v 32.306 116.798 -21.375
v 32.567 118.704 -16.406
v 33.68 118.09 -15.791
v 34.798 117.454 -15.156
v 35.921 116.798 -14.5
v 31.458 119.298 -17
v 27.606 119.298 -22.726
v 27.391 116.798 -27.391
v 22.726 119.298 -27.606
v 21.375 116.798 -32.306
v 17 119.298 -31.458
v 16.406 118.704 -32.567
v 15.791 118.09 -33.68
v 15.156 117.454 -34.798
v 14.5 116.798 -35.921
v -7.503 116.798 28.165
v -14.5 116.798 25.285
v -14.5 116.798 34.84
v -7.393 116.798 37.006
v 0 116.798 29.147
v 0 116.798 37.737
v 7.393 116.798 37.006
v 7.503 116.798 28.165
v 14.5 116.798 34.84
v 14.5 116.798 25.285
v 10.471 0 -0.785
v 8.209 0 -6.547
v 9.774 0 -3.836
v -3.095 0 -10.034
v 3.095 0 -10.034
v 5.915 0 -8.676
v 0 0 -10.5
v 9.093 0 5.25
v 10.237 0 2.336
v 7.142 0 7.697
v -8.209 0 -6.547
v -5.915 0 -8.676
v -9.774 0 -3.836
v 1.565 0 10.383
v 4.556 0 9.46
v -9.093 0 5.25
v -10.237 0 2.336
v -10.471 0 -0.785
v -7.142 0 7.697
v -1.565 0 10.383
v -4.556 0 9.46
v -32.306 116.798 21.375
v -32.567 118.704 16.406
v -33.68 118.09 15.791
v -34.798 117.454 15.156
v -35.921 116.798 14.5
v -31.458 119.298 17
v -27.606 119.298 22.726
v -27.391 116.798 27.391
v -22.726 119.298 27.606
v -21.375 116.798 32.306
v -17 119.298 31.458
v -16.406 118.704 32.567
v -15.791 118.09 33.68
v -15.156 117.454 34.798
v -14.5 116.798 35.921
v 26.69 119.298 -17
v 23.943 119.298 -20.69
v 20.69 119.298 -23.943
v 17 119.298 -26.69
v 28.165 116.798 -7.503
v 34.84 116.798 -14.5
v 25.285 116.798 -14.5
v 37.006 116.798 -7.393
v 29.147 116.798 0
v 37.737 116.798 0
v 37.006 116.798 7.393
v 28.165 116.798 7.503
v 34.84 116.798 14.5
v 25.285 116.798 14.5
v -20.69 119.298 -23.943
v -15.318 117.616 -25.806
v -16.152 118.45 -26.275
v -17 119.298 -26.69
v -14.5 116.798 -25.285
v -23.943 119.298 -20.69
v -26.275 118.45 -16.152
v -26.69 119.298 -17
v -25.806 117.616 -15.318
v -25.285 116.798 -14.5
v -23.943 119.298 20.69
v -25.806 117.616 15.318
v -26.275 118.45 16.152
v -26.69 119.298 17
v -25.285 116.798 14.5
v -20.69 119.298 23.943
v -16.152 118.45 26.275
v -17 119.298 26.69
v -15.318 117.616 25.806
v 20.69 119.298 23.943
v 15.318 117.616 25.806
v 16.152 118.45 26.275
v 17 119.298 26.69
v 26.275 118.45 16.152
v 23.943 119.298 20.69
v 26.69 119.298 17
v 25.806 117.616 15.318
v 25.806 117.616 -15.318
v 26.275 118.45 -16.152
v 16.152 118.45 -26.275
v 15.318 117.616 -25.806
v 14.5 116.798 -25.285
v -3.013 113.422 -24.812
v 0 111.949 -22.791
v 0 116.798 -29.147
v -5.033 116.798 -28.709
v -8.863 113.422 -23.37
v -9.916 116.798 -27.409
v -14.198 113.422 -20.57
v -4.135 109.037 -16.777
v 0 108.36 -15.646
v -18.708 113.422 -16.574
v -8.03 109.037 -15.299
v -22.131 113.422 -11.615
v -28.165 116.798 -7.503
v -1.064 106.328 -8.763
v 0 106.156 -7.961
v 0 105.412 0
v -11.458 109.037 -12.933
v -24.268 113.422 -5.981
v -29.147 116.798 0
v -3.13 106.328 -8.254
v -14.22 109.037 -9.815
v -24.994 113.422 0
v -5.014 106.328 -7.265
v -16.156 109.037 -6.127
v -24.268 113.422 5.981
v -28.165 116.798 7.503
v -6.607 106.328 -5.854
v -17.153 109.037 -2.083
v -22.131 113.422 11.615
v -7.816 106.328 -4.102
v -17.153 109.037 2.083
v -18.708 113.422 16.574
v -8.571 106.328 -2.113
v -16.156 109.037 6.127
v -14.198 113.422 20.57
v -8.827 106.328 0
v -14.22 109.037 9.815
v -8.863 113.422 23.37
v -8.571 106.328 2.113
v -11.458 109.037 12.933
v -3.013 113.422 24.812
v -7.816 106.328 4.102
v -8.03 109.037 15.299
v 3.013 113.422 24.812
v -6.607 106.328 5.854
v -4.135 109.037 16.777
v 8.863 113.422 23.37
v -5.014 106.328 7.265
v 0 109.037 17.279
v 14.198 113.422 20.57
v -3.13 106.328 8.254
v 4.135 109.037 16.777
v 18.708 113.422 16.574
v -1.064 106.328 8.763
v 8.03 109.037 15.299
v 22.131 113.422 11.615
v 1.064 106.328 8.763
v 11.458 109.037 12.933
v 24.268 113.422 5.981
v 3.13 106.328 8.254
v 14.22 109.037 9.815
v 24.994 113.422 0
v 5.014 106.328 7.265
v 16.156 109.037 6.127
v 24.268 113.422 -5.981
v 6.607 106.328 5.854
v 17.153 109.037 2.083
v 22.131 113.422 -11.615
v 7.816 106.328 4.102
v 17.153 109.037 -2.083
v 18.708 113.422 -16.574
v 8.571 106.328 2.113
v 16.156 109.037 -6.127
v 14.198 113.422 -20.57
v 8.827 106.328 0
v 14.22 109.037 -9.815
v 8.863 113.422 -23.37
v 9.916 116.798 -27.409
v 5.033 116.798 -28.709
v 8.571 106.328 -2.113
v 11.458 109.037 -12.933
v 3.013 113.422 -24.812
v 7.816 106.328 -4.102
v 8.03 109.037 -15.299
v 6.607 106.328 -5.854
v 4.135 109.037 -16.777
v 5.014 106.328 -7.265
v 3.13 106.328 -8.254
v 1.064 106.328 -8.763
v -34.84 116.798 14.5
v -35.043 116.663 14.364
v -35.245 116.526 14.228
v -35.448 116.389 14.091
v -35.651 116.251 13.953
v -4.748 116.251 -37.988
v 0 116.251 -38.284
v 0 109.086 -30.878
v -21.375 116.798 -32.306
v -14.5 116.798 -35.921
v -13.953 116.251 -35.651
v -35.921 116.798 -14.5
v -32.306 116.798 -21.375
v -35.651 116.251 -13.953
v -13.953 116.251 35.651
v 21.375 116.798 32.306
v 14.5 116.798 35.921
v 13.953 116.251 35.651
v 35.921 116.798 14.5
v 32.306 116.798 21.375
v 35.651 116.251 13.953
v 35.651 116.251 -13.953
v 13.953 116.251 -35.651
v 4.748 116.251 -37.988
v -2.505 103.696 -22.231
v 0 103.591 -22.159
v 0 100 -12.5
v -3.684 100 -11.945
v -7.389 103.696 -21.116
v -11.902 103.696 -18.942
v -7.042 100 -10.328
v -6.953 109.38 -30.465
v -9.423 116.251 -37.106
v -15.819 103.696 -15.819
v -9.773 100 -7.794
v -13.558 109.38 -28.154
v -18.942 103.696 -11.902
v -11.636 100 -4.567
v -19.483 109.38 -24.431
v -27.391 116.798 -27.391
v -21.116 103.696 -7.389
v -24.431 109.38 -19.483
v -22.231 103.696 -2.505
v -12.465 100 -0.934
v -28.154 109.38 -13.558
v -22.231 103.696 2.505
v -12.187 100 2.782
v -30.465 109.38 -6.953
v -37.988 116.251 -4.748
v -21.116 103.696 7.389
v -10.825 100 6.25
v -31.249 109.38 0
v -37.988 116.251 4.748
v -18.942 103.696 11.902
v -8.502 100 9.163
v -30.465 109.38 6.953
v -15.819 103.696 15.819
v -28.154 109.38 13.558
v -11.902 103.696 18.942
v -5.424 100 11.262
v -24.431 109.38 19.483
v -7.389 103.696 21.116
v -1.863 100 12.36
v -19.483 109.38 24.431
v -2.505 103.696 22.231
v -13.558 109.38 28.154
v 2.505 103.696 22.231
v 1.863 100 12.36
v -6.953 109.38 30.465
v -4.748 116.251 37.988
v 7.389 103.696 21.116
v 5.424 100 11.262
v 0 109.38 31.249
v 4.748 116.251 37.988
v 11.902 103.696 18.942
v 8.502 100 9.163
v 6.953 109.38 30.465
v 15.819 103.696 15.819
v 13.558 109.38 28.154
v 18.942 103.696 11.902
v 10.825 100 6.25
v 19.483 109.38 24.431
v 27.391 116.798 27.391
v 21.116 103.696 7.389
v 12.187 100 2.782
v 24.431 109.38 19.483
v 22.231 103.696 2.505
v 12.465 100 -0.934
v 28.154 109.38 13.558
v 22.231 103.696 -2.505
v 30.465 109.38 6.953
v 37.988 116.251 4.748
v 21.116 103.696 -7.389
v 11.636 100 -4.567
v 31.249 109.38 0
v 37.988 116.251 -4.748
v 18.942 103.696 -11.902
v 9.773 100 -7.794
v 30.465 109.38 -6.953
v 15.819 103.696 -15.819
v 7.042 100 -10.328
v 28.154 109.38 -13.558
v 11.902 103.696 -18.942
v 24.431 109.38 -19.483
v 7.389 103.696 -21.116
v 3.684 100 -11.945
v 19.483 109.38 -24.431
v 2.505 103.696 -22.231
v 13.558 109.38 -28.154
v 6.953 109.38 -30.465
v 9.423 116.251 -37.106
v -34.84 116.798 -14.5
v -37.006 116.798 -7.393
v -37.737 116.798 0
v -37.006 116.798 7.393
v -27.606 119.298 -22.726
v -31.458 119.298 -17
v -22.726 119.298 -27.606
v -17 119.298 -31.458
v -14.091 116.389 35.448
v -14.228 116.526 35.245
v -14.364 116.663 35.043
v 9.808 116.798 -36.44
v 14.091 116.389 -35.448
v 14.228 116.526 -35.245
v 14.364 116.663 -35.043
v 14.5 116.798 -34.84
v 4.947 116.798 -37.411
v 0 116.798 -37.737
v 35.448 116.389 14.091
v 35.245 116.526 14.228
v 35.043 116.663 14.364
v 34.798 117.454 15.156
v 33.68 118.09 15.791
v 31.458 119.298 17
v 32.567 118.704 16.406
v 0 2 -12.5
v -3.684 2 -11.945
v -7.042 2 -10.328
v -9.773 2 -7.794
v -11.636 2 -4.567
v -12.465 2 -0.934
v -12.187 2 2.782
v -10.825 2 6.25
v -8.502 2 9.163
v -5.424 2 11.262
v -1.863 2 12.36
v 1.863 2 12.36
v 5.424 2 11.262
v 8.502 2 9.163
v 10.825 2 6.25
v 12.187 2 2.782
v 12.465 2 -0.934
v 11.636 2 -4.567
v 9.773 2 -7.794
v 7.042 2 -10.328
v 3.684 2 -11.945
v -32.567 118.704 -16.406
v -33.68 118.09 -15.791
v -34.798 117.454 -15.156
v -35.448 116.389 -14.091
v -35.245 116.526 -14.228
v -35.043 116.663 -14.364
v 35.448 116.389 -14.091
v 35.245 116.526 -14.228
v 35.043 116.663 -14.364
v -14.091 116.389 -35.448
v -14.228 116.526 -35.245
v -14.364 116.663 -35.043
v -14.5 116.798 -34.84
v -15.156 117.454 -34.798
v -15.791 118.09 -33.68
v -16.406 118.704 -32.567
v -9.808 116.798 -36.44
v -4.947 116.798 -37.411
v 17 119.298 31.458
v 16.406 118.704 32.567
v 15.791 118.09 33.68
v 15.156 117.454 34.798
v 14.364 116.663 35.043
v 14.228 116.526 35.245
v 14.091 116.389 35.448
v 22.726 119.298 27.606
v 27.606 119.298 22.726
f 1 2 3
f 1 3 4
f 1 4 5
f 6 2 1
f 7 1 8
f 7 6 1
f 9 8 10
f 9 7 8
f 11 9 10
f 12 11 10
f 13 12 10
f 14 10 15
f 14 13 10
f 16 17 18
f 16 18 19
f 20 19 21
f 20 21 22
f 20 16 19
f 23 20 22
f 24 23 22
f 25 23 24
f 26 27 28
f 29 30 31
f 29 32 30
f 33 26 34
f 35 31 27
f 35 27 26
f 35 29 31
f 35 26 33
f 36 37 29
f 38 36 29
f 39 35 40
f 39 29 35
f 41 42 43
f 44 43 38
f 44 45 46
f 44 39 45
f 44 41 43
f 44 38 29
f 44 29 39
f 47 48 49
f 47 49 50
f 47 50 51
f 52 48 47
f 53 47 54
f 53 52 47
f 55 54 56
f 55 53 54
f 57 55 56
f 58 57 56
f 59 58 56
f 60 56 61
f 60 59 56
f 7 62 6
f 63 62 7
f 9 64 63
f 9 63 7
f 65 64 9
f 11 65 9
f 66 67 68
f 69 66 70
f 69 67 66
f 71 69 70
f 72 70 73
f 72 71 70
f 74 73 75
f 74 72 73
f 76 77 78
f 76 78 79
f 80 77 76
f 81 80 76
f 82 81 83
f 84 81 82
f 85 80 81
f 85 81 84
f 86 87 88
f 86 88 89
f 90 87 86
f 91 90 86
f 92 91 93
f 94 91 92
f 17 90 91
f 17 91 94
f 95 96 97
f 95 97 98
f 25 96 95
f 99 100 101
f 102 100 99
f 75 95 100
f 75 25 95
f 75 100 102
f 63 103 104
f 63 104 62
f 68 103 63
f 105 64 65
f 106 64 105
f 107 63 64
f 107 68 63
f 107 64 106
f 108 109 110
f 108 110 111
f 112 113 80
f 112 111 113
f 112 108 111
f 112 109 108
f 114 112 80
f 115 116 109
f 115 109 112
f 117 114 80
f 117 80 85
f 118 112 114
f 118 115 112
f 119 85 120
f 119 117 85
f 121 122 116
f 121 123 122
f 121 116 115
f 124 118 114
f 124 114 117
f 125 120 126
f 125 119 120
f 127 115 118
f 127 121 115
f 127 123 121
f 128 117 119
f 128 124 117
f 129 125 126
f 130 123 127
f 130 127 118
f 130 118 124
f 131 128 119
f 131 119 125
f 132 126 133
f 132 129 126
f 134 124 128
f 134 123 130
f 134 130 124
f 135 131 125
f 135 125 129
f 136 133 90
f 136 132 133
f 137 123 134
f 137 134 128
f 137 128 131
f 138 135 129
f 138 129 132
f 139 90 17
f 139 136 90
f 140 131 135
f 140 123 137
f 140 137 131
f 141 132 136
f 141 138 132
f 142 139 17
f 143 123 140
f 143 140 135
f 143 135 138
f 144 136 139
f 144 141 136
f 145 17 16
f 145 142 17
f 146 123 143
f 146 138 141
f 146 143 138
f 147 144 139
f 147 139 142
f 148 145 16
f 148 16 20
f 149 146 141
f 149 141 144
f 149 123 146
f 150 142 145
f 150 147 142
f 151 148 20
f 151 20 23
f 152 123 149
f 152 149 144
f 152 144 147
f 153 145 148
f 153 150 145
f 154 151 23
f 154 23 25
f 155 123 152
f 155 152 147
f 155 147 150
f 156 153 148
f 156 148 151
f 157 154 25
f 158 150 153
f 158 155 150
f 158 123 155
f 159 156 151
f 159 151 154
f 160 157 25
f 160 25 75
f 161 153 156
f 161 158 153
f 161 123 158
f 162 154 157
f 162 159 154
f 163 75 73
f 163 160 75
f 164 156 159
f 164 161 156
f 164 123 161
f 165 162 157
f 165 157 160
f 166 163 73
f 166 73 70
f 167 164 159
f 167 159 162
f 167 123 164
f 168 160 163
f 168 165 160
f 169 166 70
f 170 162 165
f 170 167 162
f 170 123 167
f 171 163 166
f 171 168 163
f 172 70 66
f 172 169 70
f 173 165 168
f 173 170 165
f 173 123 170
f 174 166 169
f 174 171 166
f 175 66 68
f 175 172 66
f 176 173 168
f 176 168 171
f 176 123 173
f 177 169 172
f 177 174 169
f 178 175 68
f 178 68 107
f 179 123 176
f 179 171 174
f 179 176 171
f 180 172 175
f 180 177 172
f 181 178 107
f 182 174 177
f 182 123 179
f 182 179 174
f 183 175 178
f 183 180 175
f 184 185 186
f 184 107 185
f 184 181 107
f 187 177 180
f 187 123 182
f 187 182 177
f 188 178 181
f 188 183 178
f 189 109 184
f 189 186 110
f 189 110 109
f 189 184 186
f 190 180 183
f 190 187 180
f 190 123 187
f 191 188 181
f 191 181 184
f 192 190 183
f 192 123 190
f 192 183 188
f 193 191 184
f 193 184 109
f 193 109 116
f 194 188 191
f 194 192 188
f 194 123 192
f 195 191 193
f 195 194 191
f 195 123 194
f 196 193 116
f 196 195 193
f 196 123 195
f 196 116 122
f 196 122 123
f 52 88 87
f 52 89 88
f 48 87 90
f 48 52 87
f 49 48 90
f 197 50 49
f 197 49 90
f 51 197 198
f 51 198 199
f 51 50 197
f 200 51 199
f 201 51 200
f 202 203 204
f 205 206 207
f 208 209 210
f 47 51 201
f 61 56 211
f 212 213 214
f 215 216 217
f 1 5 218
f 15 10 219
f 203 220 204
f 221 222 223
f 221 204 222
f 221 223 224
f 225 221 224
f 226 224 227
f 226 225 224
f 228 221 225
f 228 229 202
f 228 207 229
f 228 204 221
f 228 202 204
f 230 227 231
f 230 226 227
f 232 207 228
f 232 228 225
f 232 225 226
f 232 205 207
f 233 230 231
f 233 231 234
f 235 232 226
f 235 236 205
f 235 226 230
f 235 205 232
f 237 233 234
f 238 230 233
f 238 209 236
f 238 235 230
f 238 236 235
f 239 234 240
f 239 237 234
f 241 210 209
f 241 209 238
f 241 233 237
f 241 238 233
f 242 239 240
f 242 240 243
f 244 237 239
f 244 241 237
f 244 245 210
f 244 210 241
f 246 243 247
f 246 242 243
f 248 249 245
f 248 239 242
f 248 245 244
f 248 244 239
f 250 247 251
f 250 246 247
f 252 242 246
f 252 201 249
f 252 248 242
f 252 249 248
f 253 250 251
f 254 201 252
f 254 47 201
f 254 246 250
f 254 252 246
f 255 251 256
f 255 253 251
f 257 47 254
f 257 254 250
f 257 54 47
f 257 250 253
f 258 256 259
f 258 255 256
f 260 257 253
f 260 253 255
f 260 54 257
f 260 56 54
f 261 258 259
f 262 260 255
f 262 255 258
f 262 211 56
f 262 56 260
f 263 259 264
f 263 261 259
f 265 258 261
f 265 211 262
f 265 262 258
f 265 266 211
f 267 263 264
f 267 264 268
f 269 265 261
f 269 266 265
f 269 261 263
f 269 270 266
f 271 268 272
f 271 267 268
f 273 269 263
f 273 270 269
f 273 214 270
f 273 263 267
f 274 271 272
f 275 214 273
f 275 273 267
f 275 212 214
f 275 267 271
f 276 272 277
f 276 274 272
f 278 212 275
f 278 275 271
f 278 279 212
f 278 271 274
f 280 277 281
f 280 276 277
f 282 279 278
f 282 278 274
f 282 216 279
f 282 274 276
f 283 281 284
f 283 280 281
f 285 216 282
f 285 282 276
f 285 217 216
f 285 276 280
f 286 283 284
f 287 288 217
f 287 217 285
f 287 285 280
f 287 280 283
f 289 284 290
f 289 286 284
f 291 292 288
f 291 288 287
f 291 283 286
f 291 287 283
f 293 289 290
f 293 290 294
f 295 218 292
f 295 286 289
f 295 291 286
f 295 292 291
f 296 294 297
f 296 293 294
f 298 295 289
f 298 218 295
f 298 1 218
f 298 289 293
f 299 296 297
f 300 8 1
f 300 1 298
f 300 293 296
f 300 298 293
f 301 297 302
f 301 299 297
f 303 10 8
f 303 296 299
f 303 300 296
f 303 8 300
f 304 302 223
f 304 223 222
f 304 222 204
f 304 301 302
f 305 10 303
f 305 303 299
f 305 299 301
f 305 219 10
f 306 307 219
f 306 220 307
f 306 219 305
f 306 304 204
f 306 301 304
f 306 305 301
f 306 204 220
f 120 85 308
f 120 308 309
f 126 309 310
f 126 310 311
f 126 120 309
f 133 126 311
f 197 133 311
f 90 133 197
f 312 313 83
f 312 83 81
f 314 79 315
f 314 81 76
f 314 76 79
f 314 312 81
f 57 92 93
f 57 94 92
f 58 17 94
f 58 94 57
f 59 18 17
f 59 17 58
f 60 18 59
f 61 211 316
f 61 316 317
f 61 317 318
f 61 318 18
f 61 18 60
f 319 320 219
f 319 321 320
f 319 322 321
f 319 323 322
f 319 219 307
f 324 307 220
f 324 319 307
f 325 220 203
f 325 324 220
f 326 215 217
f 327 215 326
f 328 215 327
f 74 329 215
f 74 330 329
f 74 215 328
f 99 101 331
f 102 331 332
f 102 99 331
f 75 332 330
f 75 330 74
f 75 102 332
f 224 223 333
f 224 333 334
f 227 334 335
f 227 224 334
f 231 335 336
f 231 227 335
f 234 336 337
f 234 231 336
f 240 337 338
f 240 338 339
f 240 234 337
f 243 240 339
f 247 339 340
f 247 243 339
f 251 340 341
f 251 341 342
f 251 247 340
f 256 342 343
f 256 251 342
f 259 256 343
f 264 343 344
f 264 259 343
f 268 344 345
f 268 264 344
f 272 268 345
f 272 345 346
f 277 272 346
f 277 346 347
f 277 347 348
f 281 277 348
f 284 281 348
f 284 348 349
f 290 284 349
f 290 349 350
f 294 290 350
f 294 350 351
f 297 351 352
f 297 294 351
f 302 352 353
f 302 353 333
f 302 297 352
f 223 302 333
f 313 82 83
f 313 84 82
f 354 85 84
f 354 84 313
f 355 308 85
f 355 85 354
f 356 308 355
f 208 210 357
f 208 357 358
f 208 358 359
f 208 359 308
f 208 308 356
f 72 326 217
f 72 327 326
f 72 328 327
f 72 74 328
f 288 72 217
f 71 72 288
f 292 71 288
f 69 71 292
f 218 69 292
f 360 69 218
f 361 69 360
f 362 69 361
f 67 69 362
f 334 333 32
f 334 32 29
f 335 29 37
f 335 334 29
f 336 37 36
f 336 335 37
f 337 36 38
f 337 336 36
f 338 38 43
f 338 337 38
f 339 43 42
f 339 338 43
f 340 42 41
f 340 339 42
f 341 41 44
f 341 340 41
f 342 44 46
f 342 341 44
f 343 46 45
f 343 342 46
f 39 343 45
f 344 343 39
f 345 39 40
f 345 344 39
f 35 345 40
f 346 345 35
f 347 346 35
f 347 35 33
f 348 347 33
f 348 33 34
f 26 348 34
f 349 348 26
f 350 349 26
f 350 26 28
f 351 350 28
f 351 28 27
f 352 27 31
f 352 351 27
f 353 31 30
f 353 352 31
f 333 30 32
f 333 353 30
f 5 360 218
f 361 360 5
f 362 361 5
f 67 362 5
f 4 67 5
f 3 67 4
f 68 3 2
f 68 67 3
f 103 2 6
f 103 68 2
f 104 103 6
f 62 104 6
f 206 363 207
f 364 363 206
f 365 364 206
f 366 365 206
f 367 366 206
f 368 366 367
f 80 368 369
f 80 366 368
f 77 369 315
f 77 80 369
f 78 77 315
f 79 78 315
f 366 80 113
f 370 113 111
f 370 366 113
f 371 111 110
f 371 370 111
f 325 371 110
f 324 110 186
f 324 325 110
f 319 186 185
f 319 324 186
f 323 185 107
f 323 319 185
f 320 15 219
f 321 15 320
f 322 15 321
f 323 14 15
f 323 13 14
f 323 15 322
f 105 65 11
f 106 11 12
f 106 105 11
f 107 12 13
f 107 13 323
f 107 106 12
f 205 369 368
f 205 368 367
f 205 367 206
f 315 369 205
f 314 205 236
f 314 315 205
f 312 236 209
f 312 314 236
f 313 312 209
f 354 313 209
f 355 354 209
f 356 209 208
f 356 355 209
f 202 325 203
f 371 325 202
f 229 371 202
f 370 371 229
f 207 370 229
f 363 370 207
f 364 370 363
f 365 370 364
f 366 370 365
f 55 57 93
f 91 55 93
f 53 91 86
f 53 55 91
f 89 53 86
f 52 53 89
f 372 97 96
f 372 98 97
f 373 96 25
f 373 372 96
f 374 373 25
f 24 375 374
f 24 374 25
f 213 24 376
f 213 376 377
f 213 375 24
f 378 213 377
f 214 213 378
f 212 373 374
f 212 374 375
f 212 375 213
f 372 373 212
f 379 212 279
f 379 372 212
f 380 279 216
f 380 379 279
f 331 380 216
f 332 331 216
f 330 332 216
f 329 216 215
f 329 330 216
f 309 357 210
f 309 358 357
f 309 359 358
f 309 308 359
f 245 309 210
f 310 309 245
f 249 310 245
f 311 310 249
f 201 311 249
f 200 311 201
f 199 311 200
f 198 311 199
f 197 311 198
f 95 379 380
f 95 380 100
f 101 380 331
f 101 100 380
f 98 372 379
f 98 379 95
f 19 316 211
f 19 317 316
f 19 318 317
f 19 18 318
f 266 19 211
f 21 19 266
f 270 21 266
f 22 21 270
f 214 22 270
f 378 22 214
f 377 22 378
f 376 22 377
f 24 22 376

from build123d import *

# Parameters (mm, degrees)
CUT_EXTRUDE1_DEPTH      = 134.095432677
CIRPATTERN1_COUNT       = 2
CIRPATTERN1_ANGLE       = 90
CUT_EXTRUDE2_DEPTH      = 134.095432677
CUT_EXTRUDE2_DEPTH_BACK = 134.095432677
SKETCH4_W               = 71.692857504
SKETCH4_H               = 7.538034042
CHAMFER1_SIZE           = 1
CHAMFER2_SIZE           = 2


with BuildPart() as part:
    # Sketch2 → Revolve1 (revolve)
    with BuildSketch(Plane.XY, mode=Mode.PRIVATE) as revolve1_sk:
        with BuildLine():
            Line((0, 0), (-12.5, 0))
            Line((-12.5, 0), (-12.5, 100))
            ThreePointArc((-12.5, 100), (-26.960226668, 106.303549529), (-38.737016869, 116.798315107))
            Line((-38.737016869, 116.798315107), (-33.374125702, 121.298315107))
            ThreePointArc((-33.374125702, 121.298315107), (-18.481057884, 109.586391973), (0, 105.412291828))
            Line((0, 105.412291828), (0, 0))
        make_face()
    revolve(revolve1_sk.sketch.rotate(Axis((0, 0, 0), (0, 1, 0)), 270), axis=Axis((0, 0, 0), (0, 1, 0)))

    # Sketch3 → Cut-Extrude1 (cut, symmetric)
    with BuildSketch(Plane(origin=(0, 0, 0), x_dir=(0, 0, -1), z_dir=(1, 0, 0))):
        Polygon((-19, 121.298315107), (19, 121.298315107), (14.5, 116.798315107), (-14.5, 116.798315107), align=None)
    cut_extrude1 = extrude(amount=CUT_EXTRUDE1_DEPTH, both=True, mode=Mode.SUBTRACT)

    # CirPattern1: Cut-Extrude1 ×2 about axis
    cirpattern1_axis = Axis((0, 0, 0), (0, 1, 0))
    for i in range(1, CIRPATTERN1_COUNT):
        add(cut_extrude1.rotate(cirpattern1_axis, i * CIRPATTERN1_ANGLE / (CIRPATTERN1_COUNT - 1)), mode=Mode.SUBTRACT)

    # Sketch4 → Cut-Extrude2 (cut, two sides: drawn at the far end of the back side and taken through both)
    with BuildSketch(Plane(origin=(0, 0, 0), x_dir=(0, 0, -1), z_dir=(1, 0, 0)).offset(-CUT_EXTRUDE2_DEPTH_BACK)):
        with Locations((0, 123.067332128)):
            Rectangle(SKETCH4_W, SKETCH4_H)
    extrude(amount=CUT_EXTRUDE2_DEPTH + CUT_EXTRUDE2_DEPTH_BACK, mode=Mode.SUBTRACT)

    # Chamfer1
    # the kernel refuses this chamfer: 1, 0.710722016 mm, written as the material it takes off along each edge
    with BuildSketch(Plane(origin=(0, 116.798315107, 0), x_dir=(-0.900422371239431, 0, -0.43501672769166055), z_dir=(0.43501672769166055, 0, -0.900422371239431))) as chamfer1_piece_1_section:
        with BuildLine():
            Line((38.28405682, -0.547039951), (38.737016869 - CHAMFER1_SIZE, 0))
            Line((38.737016869 - CHAMFER1_SIZE, 0), (38.737016869, 0))
            ThreePointArc((38.737016869, 0), (38.510313841, -0.275766581), (38.28405682, -0.547039951))
        make_face()
    chamfer1_piece_1 = revolve(axis=Axis((0, 116.798315107, 0), (0, 1, 0)), revolution_arc=51.572716584, mode=Mode.PRIVATE)
    chamfer1_piece_1 = split(chamfer1_piece_1, bisect_by=Plane(origin=(0, 109.548315107, -7.25), z_dir=(0, 0.7071067811865445, 0.7071067811865507)), keep=Keep.TOP, mode=Mode.PRIVATE)
    chamfer1_piece_1 = split(chamfer1_piece_1, bisect_by=Plane(origin=(0, 109.548315107, 7.25), z_dir=(0, 0.7071067811865445, -0.7071067811865507)), keep=Keep.TOP, mode=Mode.PRIVATE)
    add(chamfer1_piece_1, mode=Mode.SUBTRACT)
    with BuildSketch(Plane(origin=(0, 116.798315107, 0), x_dir=(0.9004223712394364, 0, 0.4350167276916494), z_dir=(-0.4350167276916494, 0, 0.9004223712394364))) as chamfer1_piece_2_section:
        with BuildLine():
            Line((38.28405682, -0.547039951), (38.737016869 - CHAMFER1_SIZE, 0))
            Line((38.737016869 - CHAMFER1_SIZE, 0), (38.737016869, 0))
            ThreePointArc((38.737016869, 0), (38.510313841, -0.275766581), (38.28405682, -0.547039951))
        make_face()
    chamfer1_piece_2 = revolve(axis=Axis((0, 116.798315107, 0), (0, 1, 0)), revolution_arc=51.572716584, mode=Mode.PRIVATE)
    chamfer1_piece_2 = split(chamfer1_piece_2, bisect_by=Plane(origin=(0, 109.548315107, 7.25), z_dir=(0, 0.7071067811865445, -0.7071067811865507)), keep=Keep.TOP, mode=Mode.PRIVATE)
    chamfer1_piece_2 = split(chamfer1_piece_2, bisect_by=Plane(origin=(0, 109.548315107, -7.25), z_dir=(0, 0.7071067811865445, 0.7071067811865507)), keep=Keep.TOP, mode=Mode.PRIVATE)
    add(chamfer1_piece_2, mode=Mode.SUBTRACT)
    with BuildSketch(Plane(origin=(0, 116.798315107, 0), x_dir=(-0.43501672769166544, 0, 0.9004223712394286), z_dir=(-0.9004223712394286, 0, -0.43501672769166544))) as chamfer1_piece_3_section:
        with BuildLine():
            Line((38.28405682, -0.547039951), (38.737016869 - CHAMFER1_SIZE, 0))
            Line((38.737016869 - CHAMFER1_SIZE, 0), (38.737016869, 0))
            ThreePointArc((38.737016869, 0), (38.510313841, -0.275766581), (38.28405682, -0.547039951))
        make_face()
    chamfer1_piece_3 = revolve(axis=Axis((0, 116.798315107, 0), (0, 1, 0)), revolution_arc=51.572716584, mode=Mode.PRIVATE)
    chamfer1_piece_3 = split(chamfer1_piece_3, bisect_by=Plane(origin=(-7.25, 109.548315107, 0), z_dir=(0.7071067811865507, 0.7071067811865445, -2.5121479338940513e-15)), keep=Keep.TOP, mode=Mode.PRIVATE)
    chamfer1_piece_3 = split(chamfer1_piece_3, bisect_by=Plane(origin=(7.25, 109.548315107, 0), z_dir=(-0.7071067811865507, 0.7071067811865445, 2.5121479338940513e-15)), keep=Keep.TOP, mode=Mode.PRIVATE)
    add(chamfer1_piece_3, mode=Mode.SUBTRACT)
    with BuildSketch(Plane(origin=(0, 116.798315107, 0), x_dir=(0.4350124309167343, 0, -0.9004244471069814), z_dir=(0.9004244471069814, 0, 0.4350124309167343))) as chamfer1_piece_4_section:
        with BuildLine():
            Line((38.28405682, -0.547039951), (38.737016869 - CHAMFER1_SIZE, 0))
            Line((38.737016869 - CHAMFER1_SIZE, 0), (38.737016869, 0))
            ThreePointArc((38.737016869, 0), (38.510313841, -0.275766581), (38.28405682, -0.547039951))
        make_face()
    chamfer1_piece_4 = revolve(axis=Axis((0, 116.798315107, 0), (0, 1, 0)), revolution_arc=25.786084879, mode=Mode.PRIVATE)
    chamfer1_piece_4 = split(chamfer1_piece_4, bisect_by=Plane(origin=(7.25, 109.548315107, 0), z_dir=(-0.7071067811865507, 0.7071067811865445, 2.5121479338940513e-15)), keep=Keep.TOP, mode=Mode.PRIVATE)
    add(chamfer1_piece_4, mode=Mode.SUBTRACT)
    with BuildSketch(Plane(origin=(0, 116.798315107, 0), x_dir=(0, 0, -1), z_dir=(1, 0, 0))) as chamfer1_piece_5_section:
        with BuildLine():
            Line((38.28405682, -0.547039951), (38.737016869 - CHAMFER1_SIZE, 0))
            Line((38.737016869 - CHAMFER1_SIZE, 0), (38.737016869, 0))
            ThreePointArc((38.737016869, 0), (38.510313841, -0.275766581), (38.28405682, -0.547039951))
        make_face()
    chamfer1_piece_5 = revolve(axis=Axis((0, 116.798315107, 0), (0, 1, 0)), revolution_arc=25.786084879, mode=Mode.PRIVATE)
    chamfer1_piece_5 = split(chamfer1_piece_5, bisect_by=Plane(origin=(-7.25, 109.548315107, 0), z_dir=(0.7071067811865507, 0.7071067811865445, -2.5121479338940513e-15)), keep=Keep.TOP, mode=Mode.PRIVATE)
    add(chamfer1_piece_5, mode=Mode.SUBTRACT)

    # Chamfer2
    chamfer2_edges = [part.edges().sort_by_distance(p)[0] for p in [
        (0, 0, 12.5),
    ]]
    chamfer(chamfer2_edges, length=CHAMFER2_SIZE)


solid = part.part
